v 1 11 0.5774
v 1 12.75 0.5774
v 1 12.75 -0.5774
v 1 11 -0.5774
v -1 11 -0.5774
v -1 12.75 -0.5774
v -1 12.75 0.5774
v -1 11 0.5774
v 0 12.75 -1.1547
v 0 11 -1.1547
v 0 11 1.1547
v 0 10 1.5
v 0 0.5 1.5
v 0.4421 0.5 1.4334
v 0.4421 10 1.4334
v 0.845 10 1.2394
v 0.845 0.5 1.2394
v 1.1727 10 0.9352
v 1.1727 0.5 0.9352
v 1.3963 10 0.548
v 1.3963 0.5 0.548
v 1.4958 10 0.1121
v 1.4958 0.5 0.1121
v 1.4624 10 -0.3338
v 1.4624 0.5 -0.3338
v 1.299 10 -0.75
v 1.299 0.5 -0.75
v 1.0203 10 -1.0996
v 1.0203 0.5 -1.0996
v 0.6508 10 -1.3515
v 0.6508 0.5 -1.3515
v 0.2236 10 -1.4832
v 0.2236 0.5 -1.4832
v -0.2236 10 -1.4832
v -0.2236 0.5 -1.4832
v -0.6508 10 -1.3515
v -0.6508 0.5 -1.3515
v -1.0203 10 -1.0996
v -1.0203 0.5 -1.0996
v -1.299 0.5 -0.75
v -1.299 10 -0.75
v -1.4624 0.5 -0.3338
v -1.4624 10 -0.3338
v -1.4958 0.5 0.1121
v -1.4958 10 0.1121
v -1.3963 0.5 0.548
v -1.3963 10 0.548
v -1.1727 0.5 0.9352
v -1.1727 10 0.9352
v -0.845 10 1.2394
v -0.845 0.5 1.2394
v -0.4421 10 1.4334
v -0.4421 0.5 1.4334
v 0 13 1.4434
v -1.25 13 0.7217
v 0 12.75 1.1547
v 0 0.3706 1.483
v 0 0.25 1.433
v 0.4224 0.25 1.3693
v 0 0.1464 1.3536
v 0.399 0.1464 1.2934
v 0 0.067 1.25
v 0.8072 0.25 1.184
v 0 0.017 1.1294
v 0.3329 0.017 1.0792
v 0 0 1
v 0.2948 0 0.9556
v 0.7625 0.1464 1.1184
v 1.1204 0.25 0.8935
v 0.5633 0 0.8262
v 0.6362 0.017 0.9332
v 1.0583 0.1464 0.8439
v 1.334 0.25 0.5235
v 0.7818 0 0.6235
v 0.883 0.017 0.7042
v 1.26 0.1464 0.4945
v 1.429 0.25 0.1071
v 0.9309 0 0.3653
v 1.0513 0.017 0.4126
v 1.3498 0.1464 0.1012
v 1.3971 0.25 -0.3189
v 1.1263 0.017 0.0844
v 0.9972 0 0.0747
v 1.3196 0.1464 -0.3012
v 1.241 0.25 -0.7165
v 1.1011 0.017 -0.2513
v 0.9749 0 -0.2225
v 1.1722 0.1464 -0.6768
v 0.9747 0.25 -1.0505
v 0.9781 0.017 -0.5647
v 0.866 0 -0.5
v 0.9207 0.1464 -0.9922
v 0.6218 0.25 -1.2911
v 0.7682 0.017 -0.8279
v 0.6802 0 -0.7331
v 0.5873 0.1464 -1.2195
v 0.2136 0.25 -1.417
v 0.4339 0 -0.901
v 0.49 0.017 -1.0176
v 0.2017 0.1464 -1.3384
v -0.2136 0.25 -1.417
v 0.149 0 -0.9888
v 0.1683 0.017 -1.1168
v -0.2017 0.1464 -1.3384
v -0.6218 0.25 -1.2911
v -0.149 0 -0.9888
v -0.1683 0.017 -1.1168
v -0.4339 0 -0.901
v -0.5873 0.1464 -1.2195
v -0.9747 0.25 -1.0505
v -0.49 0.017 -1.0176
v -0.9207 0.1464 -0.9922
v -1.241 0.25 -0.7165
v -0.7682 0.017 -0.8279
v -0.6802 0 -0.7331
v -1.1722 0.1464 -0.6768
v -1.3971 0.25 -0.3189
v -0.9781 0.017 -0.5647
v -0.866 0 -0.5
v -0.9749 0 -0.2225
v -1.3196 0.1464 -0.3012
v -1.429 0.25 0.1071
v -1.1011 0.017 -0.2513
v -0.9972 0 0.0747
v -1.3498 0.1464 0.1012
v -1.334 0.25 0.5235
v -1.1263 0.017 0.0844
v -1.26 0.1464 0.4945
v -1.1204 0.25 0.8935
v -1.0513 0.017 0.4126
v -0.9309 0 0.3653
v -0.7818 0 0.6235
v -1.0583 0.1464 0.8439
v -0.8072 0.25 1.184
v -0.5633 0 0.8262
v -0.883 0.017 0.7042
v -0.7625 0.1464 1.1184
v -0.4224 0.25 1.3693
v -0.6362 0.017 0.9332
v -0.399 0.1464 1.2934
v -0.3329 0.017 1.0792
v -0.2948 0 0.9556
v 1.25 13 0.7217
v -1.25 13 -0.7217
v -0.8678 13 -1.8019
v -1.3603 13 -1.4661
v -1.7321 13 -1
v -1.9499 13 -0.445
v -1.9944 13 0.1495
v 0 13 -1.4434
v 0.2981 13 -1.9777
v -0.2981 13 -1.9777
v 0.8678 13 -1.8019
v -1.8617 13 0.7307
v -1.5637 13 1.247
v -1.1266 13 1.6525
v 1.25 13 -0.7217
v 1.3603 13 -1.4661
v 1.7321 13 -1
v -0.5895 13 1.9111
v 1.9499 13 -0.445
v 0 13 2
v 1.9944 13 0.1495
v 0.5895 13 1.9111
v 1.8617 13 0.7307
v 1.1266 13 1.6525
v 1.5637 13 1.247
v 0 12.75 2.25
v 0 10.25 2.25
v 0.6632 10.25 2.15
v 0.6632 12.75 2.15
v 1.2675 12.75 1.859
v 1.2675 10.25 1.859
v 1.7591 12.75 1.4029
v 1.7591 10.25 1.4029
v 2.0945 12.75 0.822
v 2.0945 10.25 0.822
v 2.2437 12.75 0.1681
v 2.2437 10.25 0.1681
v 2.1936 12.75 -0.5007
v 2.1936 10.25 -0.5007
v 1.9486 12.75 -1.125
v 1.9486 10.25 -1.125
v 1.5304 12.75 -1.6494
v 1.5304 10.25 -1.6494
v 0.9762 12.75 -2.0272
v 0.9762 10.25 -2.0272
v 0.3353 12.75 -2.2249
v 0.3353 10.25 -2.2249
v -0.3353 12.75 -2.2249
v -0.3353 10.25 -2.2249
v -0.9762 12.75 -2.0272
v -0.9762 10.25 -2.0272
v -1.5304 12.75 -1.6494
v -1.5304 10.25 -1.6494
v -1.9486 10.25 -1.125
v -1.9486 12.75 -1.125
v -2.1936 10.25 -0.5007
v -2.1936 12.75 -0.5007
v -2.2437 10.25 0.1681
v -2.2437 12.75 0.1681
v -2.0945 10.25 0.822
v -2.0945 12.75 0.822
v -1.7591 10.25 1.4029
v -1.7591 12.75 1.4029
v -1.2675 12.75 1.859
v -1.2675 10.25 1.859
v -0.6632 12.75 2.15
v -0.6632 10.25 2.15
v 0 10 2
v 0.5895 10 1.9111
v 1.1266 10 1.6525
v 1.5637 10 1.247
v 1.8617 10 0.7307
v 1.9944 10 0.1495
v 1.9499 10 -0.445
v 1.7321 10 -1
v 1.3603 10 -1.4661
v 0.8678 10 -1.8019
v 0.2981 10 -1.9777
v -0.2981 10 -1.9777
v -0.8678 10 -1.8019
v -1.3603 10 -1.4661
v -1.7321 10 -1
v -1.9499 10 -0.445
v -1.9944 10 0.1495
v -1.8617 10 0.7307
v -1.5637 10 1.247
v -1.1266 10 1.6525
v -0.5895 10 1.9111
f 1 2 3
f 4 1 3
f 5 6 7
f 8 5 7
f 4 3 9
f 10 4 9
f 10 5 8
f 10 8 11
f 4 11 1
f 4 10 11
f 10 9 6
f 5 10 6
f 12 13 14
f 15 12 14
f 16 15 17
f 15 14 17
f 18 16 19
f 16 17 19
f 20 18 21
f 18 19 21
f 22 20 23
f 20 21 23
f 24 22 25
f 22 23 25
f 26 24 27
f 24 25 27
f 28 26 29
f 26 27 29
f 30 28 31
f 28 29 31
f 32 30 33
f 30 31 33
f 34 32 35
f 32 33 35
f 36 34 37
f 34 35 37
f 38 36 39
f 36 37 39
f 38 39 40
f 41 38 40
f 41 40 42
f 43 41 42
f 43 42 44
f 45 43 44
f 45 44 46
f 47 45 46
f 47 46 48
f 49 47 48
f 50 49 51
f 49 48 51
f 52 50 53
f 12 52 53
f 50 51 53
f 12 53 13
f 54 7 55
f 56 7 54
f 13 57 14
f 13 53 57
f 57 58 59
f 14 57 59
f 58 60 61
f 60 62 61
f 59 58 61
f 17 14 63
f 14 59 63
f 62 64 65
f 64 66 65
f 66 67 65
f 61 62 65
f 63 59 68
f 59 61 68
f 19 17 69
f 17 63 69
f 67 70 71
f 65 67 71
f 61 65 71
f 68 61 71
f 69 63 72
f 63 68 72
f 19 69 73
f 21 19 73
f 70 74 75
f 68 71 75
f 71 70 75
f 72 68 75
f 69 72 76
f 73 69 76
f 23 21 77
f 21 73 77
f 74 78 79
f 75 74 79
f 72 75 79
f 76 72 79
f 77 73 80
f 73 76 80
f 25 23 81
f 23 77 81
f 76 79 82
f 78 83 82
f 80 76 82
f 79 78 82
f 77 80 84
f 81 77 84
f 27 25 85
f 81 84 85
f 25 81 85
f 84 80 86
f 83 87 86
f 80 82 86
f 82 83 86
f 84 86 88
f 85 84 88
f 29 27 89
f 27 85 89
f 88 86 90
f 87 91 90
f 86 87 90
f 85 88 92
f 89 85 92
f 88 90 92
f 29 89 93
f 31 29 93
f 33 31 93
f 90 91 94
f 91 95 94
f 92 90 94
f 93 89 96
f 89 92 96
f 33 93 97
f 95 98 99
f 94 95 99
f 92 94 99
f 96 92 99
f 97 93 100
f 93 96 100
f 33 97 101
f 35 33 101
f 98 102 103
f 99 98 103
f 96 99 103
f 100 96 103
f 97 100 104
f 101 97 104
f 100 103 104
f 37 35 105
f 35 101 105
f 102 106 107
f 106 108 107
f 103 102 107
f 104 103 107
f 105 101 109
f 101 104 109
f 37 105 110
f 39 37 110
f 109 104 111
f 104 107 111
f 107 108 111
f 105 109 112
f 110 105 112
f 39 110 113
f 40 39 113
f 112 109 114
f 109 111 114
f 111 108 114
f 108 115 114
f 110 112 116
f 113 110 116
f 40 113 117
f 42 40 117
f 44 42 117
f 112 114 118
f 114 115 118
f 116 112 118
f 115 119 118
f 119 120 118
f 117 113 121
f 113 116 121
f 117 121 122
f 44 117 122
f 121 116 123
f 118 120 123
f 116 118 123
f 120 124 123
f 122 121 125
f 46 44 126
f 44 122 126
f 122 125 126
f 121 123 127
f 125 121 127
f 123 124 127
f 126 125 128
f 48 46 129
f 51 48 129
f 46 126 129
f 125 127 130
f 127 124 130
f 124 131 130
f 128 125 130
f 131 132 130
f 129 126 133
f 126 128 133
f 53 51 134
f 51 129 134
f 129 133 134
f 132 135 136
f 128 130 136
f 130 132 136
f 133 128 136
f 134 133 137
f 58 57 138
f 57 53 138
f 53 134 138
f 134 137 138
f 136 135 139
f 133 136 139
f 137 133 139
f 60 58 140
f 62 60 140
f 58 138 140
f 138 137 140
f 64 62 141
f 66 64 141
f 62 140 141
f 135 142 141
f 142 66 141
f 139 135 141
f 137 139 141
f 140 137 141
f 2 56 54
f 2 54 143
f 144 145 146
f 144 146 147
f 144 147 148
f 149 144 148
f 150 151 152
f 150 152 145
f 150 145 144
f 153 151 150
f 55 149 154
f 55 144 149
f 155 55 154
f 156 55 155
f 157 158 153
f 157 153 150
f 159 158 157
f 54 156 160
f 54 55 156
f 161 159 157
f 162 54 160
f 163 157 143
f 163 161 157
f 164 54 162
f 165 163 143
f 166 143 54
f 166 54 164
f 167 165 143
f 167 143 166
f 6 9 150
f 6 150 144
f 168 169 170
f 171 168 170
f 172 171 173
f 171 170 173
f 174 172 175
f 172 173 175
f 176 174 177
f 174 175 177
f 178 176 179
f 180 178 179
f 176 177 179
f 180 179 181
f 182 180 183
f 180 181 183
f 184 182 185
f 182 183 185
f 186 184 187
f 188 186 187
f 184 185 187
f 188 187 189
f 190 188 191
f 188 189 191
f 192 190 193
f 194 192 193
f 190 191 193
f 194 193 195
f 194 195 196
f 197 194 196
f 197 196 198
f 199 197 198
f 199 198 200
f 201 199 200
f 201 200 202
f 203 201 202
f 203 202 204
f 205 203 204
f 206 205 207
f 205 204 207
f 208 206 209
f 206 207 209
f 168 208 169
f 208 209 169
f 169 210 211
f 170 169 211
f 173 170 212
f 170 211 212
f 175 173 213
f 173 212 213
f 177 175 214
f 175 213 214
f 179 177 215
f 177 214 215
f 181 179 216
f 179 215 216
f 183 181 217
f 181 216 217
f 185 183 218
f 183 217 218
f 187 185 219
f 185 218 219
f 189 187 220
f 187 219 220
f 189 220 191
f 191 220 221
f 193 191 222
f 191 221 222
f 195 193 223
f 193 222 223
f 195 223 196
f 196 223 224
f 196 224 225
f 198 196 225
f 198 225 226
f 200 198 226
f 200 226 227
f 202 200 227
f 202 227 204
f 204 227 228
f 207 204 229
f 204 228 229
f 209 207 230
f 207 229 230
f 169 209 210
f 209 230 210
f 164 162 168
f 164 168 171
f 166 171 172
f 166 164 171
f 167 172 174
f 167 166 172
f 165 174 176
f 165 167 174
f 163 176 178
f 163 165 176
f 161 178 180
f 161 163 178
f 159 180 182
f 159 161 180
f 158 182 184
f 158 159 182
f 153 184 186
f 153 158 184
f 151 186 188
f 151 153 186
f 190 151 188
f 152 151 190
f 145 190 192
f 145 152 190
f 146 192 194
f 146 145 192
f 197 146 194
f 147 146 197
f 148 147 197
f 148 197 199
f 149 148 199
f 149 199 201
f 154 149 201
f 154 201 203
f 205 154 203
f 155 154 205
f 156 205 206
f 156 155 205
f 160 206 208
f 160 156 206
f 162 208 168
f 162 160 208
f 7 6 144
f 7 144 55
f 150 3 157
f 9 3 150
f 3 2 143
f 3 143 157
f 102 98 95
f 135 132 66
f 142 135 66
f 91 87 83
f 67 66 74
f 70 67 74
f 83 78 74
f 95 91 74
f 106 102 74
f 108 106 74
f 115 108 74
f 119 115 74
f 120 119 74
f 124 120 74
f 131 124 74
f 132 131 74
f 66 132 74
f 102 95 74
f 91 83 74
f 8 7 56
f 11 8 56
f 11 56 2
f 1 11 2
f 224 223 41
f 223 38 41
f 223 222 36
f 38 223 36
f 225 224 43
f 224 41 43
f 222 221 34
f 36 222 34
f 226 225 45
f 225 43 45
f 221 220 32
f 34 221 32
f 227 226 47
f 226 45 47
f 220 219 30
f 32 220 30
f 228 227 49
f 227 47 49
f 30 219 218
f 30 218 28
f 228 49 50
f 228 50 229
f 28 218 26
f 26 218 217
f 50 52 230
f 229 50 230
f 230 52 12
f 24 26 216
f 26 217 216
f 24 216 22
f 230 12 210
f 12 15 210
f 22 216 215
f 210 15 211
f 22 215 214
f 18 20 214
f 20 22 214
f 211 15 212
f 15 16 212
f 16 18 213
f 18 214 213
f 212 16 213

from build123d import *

# Parameters (mm, degrees)
SKETCH1_R           = 1.5
BOSS_EXTRUDE1_DEPTH = 10
SKETCH2_R           = 2.25
BOSS_EXTRUDE2_DEPTH = 3
CUT_EXTRUDE1_DEPTH  = 2
CHAMFER1_SIZE       = 0.25
FILLET1_R           = 0.5


with BuildPart() as part:
    # Sketch1 → Boss-Extrude1 (new body)
    with BuildSketch(Plane(origin=(0, 0, 0), x_dir=(1, 0, 0), z_dir=(0, 1, 0))):
        with Locations(Location((0, 0, 0), (0, 0, 270))):
            Circle(SKETCH1_R)
    extrude(amount=BOSS_EXTRUDE1_DEPTH)

    # Sketch2 → Boss-Extrude2 (add)
    with BuildSketch(Plane(origin=(0, 10, 0), x_dir=(1, 0, 0), z_dir=(0, 1, 0))):
        with Locations(Location((0, 0, 0), (0, 0, 270))):
            Circle(SKETCH2_R)
    extrude(amount=BOSS_EXTRUDE2_DEPTH)

    # Sketch3 → Cut-Extrude1 (cut)
    with BuildSketch(Plane(origin=(0, 13, 0), x_dir=(1, 0, 0), z_dir=(0, 1, 0))):
        Polygon((0, 1.154700538), (-1, 0.577350269), (-1, -0.577350269), (0, -1.154700538), (1, -0.577350269), (1, 0.577350269), align=None)
    extrude(amount=-CUT_EXTRUDE1_DEPTH, mode=Mode.SUBTRACT)

    # Chamfer1
    chamfer1_edges = [part.edges().sort_by_distance(p)[0] for p in [
        (0.5, 13, -0.866025404),
        (-0.5, 13, -0.866025404),
        (-1, 13, 0),
        (-0.5, 13, 0.866025404),
        (0.5, 13, 0.866025404),
        (1, 13, 0),
        (0, 10, -2.25),
        (0, 13, -2.25),
    ]]
    chamfer(chamfer1_edges, length=CHAMFER1_SIZE)

    # Fillet1
    fillet1_edges = [part.edges().sort_by_distance(p)[0] for p in [
        (0, 0, -1.5),
    ]]
    fillet(fillet1_edges, radius=FILLET1_R)


solid = part.part
